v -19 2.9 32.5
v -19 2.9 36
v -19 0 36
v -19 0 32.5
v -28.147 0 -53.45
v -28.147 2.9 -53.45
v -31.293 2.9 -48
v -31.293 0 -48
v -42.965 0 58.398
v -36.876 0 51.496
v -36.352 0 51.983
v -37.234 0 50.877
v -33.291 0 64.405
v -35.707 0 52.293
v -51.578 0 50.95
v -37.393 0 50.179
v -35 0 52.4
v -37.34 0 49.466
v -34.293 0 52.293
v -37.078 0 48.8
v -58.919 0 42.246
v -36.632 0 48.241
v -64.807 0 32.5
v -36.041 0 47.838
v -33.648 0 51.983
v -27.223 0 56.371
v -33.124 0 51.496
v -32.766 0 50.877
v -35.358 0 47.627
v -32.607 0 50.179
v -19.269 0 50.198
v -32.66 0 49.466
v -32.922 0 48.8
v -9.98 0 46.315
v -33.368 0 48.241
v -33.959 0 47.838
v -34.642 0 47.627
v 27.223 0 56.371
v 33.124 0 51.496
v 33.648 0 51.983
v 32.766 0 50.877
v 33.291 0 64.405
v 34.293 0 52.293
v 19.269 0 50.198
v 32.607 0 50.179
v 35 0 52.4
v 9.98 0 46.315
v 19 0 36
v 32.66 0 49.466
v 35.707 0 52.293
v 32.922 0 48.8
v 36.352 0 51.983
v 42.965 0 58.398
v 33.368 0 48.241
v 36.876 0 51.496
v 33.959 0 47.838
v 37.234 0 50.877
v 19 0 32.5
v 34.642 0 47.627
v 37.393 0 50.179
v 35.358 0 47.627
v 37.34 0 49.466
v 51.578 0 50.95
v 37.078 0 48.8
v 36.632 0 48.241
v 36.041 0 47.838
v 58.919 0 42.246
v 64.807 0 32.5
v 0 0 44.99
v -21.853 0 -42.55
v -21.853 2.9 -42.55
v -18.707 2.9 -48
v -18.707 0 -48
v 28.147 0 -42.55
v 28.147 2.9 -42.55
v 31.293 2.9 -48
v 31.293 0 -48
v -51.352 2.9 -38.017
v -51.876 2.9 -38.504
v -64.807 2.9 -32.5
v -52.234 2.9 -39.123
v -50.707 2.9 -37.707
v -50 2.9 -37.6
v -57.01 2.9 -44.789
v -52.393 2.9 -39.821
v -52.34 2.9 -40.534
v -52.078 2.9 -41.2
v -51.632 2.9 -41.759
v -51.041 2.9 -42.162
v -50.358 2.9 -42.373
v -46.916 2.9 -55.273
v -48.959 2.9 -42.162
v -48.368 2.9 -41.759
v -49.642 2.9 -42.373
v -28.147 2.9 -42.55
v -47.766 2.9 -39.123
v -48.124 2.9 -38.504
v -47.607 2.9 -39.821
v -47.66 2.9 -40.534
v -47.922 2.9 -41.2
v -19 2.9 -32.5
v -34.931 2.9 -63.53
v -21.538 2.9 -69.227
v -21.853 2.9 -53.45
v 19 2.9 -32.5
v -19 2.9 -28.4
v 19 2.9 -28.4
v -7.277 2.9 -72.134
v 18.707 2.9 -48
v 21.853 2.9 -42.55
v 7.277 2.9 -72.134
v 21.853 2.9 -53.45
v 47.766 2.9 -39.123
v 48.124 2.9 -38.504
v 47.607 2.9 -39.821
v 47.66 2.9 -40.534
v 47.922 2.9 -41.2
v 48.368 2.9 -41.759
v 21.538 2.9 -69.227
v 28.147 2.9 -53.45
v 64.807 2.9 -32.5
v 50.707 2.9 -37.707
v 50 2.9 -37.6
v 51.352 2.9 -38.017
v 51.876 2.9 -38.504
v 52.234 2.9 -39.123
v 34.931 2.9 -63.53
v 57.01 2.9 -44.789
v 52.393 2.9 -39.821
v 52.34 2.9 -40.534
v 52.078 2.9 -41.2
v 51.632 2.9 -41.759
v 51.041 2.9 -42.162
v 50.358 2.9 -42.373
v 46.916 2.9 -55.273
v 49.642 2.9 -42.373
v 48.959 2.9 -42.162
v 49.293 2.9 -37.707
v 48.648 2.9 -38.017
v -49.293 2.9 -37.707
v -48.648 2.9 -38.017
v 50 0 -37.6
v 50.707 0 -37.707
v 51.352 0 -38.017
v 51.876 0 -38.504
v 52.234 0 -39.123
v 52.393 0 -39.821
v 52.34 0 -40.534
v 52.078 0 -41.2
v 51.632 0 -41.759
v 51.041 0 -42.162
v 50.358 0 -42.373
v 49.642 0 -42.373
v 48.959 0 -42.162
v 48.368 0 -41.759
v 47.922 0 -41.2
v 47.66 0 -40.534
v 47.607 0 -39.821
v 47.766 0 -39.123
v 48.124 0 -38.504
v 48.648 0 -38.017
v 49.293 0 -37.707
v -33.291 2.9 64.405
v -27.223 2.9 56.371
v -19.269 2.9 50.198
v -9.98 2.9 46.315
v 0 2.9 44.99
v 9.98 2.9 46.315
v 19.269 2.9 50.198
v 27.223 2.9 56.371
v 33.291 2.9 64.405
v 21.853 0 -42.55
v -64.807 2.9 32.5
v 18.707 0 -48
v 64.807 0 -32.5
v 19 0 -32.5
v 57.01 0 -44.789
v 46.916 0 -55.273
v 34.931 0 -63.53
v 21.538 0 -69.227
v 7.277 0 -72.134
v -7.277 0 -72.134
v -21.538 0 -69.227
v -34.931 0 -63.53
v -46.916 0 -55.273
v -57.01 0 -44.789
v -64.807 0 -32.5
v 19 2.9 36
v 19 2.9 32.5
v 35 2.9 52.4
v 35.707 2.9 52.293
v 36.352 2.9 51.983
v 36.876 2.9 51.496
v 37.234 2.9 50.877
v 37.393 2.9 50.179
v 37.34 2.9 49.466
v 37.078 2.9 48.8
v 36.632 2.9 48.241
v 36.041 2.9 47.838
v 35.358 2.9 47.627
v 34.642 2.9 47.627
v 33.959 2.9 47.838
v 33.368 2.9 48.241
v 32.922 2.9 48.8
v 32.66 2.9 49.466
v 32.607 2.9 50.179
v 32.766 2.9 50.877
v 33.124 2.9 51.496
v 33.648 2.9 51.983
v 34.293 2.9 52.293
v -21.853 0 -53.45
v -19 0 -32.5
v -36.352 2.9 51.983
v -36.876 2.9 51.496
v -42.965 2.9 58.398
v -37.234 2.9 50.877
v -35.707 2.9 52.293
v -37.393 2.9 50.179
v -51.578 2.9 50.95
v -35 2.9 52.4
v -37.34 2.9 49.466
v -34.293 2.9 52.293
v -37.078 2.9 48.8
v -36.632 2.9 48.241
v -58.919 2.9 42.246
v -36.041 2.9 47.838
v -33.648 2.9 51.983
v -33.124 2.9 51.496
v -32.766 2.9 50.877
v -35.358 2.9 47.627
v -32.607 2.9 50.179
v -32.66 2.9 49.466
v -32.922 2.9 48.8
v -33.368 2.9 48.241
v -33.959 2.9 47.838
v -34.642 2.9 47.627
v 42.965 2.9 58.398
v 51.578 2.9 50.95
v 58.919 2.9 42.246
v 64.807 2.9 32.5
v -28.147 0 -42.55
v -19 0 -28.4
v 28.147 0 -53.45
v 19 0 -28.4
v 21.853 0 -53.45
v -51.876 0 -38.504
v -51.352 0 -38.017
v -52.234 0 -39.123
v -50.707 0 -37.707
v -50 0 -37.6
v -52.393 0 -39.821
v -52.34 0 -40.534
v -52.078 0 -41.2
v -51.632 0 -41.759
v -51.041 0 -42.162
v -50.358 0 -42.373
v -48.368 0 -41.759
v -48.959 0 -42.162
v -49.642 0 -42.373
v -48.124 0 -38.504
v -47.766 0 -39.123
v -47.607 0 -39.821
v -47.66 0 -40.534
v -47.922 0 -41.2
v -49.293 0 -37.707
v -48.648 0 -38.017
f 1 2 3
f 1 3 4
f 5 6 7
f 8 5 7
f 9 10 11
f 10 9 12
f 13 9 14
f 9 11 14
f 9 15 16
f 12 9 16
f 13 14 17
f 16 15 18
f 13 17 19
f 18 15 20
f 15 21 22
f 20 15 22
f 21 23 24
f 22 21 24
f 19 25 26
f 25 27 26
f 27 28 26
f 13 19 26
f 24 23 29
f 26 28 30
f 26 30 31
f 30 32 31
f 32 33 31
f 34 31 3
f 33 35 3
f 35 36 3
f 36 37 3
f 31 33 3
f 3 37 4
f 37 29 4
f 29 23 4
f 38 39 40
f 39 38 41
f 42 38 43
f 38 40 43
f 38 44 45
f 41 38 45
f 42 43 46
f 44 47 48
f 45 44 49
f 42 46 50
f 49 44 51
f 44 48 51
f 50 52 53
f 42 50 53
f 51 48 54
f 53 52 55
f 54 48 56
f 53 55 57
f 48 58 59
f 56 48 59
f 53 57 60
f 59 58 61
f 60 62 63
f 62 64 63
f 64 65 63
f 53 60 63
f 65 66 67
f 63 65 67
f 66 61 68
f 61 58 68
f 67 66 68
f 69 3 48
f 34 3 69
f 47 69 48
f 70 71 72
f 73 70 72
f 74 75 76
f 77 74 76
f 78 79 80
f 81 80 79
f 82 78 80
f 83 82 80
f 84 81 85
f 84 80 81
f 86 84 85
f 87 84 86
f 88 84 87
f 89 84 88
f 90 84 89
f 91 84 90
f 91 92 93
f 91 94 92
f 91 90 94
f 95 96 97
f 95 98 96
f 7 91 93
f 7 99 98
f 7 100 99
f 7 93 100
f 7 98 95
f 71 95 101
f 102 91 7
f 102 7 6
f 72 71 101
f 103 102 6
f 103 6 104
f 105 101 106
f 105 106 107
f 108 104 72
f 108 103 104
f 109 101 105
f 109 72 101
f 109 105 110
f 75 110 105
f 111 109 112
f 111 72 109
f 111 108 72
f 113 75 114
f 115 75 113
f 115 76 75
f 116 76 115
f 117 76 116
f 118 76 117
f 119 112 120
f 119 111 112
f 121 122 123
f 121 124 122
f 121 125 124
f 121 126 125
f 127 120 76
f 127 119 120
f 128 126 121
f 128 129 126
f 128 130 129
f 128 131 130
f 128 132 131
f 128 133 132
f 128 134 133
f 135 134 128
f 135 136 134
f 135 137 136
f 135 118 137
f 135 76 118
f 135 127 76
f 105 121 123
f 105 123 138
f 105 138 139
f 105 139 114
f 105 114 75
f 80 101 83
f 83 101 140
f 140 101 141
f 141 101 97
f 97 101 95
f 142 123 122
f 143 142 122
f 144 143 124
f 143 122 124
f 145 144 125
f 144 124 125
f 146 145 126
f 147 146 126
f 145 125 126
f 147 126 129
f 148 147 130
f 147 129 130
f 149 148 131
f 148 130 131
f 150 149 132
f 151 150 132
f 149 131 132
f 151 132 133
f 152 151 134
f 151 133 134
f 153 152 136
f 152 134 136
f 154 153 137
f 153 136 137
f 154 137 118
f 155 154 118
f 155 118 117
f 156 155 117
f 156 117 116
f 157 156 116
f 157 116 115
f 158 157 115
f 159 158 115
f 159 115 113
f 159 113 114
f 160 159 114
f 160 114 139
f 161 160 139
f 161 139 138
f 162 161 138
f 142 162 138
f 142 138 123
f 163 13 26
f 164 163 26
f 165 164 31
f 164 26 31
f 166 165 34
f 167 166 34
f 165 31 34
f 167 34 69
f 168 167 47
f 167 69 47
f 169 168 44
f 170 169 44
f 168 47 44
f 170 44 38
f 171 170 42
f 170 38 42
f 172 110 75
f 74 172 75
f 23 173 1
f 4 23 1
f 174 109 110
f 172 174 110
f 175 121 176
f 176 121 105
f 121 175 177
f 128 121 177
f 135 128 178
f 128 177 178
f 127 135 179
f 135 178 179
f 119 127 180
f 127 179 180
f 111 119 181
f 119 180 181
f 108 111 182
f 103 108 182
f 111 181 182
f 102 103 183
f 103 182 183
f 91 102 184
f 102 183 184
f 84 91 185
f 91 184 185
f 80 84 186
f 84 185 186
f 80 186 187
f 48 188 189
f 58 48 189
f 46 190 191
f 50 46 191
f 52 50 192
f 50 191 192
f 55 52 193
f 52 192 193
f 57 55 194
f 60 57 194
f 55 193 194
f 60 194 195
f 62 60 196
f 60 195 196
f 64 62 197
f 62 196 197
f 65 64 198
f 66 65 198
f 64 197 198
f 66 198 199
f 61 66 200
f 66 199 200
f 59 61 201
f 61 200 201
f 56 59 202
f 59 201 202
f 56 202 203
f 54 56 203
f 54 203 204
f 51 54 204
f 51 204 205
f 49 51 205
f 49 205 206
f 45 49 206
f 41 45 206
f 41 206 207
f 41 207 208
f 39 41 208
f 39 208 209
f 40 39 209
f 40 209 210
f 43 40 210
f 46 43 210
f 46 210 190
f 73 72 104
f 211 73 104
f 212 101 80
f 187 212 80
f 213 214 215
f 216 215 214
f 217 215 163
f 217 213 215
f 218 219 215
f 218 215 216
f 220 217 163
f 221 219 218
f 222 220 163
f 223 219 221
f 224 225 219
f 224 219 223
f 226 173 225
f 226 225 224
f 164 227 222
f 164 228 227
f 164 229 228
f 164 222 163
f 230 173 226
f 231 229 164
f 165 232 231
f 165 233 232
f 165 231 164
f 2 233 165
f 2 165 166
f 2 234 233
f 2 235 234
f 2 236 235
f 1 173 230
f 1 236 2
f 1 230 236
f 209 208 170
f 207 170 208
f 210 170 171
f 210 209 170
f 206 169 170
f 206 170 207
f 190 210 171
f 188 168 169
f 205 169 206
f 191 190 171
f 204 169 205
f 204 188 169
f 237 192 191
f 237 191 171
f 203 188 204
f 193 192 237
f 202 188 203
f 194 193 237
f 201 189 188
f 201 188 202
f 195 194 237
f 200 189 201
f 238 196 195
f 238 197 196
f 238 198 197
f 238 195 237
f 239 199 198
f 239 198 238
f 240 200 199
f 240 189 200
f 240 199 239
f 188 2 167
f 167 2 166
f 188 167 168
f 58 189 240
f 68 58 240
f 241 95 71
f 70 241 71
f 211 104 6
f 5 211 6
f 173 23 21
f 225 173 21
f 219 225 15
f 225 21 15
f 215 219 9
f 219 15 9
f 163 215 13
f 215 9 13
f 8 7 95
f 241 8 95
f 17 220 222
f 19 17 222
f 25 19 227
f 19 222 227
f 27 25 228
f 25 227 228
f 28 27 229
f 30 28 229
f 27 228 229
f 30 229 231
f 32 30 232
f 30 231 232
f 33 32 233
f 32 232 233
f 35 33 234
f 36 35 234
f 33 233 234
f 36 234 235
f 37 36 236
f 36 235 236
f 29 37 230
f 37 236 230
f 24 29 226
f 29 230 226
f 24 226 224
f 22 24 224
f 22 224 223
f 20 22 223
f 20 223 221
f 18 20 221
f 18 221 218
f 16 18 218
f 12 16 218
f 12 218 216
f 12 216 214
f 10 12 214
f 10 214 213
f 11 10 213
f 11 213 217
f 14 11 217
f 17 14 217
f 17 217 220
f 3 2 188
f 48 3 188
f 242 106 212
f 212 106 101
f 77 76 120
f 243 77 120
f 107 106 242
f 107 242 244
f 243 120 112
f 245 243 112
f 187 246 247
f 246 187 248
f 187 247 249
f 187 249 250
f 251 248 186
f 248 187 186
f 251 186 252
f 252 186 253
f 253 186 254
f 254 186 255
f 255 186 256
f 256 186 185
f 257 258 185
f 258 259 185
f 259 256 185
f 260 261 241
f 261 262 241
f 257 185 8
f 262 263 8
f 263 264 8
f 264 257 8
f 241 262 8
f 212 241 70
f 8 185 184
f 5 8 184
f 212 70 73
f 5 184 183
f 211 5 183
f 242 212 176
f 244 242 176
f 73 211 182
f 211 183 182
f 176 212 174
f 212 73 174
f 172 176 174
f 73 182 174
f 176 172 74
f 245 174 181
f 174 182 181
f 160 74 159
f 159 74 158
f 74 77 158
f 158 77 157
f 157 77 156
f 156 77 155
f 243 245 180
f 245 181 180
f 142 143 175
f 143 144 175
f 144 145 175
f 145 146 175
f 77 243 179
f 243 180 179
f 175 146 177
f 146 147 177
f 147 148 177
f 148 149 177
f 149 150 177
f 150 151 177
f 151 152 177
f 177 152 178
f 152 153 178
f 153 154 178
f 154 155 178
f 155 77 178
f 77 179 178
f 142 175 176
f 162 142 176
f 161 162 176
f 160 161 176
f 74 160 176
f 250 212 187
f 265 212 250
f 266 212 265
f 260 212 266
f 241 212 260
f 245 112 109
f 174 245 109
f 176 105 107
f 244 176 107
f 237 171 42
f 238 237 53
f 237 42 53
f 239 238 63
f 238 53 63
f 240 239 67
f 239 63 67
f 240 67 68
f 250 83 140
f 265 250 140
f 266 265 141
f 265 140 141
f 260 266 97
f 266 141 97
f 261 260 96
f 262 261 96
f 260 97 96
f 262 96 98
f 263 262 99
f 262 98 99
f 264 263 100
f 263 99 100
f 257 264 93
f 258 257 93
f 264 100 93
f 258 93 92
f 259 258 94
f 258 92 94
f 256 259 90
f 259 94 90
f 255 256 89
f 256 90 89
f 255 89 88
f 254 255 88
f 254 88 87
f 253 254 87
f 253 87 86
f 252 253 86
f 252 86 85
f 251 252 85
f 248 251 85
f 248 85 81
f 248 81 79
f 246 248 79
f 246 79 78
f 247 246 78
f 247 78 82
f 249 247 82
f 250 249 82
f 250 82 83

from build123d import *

# Parameters (mm, degrees)
BOSS_EXTRUDE1_DEPTH  = 2.9
SOLENOID_PLACEMENT_W = 38
SOLENOID_PLACEMENT_H = 64.4
CUT_EXTRUDE1_DEPTH   = 103.571487266
CUT_EXTRUDE5_DEPTH   = 103.571487266
SKETCH6_R            = 2.4
CUT_EXTRUDE6_DEPTH   = 103.571487266
CUT_EXTRUDE3_DEPTH   = 103.571487266


with BuildPart() as part:
    # Sketch1 → Boss-Extrude1 (new body)
    with BuildSketch(Plane(origin=(0, 0, 0), x_dir=(1, 0, 0), z_dir=(0, 1, 0))):
        with BuildLine():
            ThreePointArc((33.29110537, -64.404598464), (0, 72.5), (-33.29110537, -64.404598464))
            ThreePointArc((-33.29110537, -64.404598464), (0, -44.989799638), (33.29110537, -64.404598464))
        make_face()
    extrude(amount=BOSS_EXTRUDE1_DEPTH)

    # solenoid placement → Cut-Extrude1 (cut, through all)
    with BuildSketch(Plane(origin=(0, 2.9, 0), x_dir=(1, 0, 0), z_dir=(0, 1, 0))):
        with Locations((0, -3.8)):
            Rectangle(SOLENOID_PLACEMENT_W, SOLENOID_PLACEMENT_H)
    extrude(amount=-CUT_EXTRUDE1_DEPTH, mode=Mode.SUBTRACT)

    # Sketch5 → Cut-Extrude5 (cut, through all)
    with BuildSketch(Plane(origin=(0, 2.9, 0), x_dir=(1, 0, 0), z_dir=(0, 1, 0))):
        Polygon((-18.706882066, 48), (-21.853441033, 53.45), (-28.146558967, 53.45), (-31.293117934, 48), (-28.146558967, 42.55), (-21.853441033, 42.55), align=None)
        Polygon((18.706882066, 48), (21.853441033, 42.55), (28.146558967, 42.55), (31.293117934, 48), (28.146558967, 53.45), (21.853441033, 53.45), align=None)
    extrude(amount=-CUT_EXTRUDE5_DEPTH, mode=Mode.SUBTRACT)

    # Sketch6 → Cut-Extrude6 (cut, through all)
    with BuildSketch(Plane(origin=(0, 2.9, 0), x_dir=(1, 0, 0), z_dir=(0, 1, 0))):
        with Locations(Location((35, -50, 0), (0, 0, 270))):
            Circle(SKETCH6_R)
        with Locations(Location((-35, -50, 0), (0, 0, 270))):
            Circle(SKETCH6_R)
        with Locations(Location((-50, 40, 0), (0, 0, 270))):
            Circle(SKETCH6_R)
        with Locations(Location((50, 40, 0), (0, 0, 270))):
            Circle(SKETCH6_R)
    extrude(amount=-CUT_EXTRUDE6_DEPTH, mode=Mode.SUBTRACT)

    # Sketch3 → Cut-Extrude3 (cut, through all)
    with BuildSketch(Plane(origin=(0, 2.9, 0), x_dir=(1, 0, 0), z_dir=(0, 1, 0))):
        Polygon((-19, 28.4), (-19, 32.5), (-72.5, 32.5), (-72.5, -32.5), (72.5, -32.5), (72.5, 32.5), (19, 32.5), (19, 28.4), align=None)
    extrude(amount=-CUT_EXTRUDE3_DEPTH, mode=Mode.SUBTRACT)


with BuildPart() as cut_extrude3_piece_1:
    # of the separate pieces the step leaves, piece 1, a body of its own (cut_extrude3_pieces)
    add(part.part.solids().sort_by_distance((64.807406984, 0, -32.5))[0])


with BuildPart() as cut_extrude3_piece_2:
    # of the separate pieces the step leaves, piece 2, a body of its own (cut_extrude3_pieces)
    add(part.part.solids().sort_by_distance((-33.29110537, 0, 64.404598464))[0])


solid = Compound([cut_extrude3_piece_1.part, cut_extrude3_piece_2.part])
